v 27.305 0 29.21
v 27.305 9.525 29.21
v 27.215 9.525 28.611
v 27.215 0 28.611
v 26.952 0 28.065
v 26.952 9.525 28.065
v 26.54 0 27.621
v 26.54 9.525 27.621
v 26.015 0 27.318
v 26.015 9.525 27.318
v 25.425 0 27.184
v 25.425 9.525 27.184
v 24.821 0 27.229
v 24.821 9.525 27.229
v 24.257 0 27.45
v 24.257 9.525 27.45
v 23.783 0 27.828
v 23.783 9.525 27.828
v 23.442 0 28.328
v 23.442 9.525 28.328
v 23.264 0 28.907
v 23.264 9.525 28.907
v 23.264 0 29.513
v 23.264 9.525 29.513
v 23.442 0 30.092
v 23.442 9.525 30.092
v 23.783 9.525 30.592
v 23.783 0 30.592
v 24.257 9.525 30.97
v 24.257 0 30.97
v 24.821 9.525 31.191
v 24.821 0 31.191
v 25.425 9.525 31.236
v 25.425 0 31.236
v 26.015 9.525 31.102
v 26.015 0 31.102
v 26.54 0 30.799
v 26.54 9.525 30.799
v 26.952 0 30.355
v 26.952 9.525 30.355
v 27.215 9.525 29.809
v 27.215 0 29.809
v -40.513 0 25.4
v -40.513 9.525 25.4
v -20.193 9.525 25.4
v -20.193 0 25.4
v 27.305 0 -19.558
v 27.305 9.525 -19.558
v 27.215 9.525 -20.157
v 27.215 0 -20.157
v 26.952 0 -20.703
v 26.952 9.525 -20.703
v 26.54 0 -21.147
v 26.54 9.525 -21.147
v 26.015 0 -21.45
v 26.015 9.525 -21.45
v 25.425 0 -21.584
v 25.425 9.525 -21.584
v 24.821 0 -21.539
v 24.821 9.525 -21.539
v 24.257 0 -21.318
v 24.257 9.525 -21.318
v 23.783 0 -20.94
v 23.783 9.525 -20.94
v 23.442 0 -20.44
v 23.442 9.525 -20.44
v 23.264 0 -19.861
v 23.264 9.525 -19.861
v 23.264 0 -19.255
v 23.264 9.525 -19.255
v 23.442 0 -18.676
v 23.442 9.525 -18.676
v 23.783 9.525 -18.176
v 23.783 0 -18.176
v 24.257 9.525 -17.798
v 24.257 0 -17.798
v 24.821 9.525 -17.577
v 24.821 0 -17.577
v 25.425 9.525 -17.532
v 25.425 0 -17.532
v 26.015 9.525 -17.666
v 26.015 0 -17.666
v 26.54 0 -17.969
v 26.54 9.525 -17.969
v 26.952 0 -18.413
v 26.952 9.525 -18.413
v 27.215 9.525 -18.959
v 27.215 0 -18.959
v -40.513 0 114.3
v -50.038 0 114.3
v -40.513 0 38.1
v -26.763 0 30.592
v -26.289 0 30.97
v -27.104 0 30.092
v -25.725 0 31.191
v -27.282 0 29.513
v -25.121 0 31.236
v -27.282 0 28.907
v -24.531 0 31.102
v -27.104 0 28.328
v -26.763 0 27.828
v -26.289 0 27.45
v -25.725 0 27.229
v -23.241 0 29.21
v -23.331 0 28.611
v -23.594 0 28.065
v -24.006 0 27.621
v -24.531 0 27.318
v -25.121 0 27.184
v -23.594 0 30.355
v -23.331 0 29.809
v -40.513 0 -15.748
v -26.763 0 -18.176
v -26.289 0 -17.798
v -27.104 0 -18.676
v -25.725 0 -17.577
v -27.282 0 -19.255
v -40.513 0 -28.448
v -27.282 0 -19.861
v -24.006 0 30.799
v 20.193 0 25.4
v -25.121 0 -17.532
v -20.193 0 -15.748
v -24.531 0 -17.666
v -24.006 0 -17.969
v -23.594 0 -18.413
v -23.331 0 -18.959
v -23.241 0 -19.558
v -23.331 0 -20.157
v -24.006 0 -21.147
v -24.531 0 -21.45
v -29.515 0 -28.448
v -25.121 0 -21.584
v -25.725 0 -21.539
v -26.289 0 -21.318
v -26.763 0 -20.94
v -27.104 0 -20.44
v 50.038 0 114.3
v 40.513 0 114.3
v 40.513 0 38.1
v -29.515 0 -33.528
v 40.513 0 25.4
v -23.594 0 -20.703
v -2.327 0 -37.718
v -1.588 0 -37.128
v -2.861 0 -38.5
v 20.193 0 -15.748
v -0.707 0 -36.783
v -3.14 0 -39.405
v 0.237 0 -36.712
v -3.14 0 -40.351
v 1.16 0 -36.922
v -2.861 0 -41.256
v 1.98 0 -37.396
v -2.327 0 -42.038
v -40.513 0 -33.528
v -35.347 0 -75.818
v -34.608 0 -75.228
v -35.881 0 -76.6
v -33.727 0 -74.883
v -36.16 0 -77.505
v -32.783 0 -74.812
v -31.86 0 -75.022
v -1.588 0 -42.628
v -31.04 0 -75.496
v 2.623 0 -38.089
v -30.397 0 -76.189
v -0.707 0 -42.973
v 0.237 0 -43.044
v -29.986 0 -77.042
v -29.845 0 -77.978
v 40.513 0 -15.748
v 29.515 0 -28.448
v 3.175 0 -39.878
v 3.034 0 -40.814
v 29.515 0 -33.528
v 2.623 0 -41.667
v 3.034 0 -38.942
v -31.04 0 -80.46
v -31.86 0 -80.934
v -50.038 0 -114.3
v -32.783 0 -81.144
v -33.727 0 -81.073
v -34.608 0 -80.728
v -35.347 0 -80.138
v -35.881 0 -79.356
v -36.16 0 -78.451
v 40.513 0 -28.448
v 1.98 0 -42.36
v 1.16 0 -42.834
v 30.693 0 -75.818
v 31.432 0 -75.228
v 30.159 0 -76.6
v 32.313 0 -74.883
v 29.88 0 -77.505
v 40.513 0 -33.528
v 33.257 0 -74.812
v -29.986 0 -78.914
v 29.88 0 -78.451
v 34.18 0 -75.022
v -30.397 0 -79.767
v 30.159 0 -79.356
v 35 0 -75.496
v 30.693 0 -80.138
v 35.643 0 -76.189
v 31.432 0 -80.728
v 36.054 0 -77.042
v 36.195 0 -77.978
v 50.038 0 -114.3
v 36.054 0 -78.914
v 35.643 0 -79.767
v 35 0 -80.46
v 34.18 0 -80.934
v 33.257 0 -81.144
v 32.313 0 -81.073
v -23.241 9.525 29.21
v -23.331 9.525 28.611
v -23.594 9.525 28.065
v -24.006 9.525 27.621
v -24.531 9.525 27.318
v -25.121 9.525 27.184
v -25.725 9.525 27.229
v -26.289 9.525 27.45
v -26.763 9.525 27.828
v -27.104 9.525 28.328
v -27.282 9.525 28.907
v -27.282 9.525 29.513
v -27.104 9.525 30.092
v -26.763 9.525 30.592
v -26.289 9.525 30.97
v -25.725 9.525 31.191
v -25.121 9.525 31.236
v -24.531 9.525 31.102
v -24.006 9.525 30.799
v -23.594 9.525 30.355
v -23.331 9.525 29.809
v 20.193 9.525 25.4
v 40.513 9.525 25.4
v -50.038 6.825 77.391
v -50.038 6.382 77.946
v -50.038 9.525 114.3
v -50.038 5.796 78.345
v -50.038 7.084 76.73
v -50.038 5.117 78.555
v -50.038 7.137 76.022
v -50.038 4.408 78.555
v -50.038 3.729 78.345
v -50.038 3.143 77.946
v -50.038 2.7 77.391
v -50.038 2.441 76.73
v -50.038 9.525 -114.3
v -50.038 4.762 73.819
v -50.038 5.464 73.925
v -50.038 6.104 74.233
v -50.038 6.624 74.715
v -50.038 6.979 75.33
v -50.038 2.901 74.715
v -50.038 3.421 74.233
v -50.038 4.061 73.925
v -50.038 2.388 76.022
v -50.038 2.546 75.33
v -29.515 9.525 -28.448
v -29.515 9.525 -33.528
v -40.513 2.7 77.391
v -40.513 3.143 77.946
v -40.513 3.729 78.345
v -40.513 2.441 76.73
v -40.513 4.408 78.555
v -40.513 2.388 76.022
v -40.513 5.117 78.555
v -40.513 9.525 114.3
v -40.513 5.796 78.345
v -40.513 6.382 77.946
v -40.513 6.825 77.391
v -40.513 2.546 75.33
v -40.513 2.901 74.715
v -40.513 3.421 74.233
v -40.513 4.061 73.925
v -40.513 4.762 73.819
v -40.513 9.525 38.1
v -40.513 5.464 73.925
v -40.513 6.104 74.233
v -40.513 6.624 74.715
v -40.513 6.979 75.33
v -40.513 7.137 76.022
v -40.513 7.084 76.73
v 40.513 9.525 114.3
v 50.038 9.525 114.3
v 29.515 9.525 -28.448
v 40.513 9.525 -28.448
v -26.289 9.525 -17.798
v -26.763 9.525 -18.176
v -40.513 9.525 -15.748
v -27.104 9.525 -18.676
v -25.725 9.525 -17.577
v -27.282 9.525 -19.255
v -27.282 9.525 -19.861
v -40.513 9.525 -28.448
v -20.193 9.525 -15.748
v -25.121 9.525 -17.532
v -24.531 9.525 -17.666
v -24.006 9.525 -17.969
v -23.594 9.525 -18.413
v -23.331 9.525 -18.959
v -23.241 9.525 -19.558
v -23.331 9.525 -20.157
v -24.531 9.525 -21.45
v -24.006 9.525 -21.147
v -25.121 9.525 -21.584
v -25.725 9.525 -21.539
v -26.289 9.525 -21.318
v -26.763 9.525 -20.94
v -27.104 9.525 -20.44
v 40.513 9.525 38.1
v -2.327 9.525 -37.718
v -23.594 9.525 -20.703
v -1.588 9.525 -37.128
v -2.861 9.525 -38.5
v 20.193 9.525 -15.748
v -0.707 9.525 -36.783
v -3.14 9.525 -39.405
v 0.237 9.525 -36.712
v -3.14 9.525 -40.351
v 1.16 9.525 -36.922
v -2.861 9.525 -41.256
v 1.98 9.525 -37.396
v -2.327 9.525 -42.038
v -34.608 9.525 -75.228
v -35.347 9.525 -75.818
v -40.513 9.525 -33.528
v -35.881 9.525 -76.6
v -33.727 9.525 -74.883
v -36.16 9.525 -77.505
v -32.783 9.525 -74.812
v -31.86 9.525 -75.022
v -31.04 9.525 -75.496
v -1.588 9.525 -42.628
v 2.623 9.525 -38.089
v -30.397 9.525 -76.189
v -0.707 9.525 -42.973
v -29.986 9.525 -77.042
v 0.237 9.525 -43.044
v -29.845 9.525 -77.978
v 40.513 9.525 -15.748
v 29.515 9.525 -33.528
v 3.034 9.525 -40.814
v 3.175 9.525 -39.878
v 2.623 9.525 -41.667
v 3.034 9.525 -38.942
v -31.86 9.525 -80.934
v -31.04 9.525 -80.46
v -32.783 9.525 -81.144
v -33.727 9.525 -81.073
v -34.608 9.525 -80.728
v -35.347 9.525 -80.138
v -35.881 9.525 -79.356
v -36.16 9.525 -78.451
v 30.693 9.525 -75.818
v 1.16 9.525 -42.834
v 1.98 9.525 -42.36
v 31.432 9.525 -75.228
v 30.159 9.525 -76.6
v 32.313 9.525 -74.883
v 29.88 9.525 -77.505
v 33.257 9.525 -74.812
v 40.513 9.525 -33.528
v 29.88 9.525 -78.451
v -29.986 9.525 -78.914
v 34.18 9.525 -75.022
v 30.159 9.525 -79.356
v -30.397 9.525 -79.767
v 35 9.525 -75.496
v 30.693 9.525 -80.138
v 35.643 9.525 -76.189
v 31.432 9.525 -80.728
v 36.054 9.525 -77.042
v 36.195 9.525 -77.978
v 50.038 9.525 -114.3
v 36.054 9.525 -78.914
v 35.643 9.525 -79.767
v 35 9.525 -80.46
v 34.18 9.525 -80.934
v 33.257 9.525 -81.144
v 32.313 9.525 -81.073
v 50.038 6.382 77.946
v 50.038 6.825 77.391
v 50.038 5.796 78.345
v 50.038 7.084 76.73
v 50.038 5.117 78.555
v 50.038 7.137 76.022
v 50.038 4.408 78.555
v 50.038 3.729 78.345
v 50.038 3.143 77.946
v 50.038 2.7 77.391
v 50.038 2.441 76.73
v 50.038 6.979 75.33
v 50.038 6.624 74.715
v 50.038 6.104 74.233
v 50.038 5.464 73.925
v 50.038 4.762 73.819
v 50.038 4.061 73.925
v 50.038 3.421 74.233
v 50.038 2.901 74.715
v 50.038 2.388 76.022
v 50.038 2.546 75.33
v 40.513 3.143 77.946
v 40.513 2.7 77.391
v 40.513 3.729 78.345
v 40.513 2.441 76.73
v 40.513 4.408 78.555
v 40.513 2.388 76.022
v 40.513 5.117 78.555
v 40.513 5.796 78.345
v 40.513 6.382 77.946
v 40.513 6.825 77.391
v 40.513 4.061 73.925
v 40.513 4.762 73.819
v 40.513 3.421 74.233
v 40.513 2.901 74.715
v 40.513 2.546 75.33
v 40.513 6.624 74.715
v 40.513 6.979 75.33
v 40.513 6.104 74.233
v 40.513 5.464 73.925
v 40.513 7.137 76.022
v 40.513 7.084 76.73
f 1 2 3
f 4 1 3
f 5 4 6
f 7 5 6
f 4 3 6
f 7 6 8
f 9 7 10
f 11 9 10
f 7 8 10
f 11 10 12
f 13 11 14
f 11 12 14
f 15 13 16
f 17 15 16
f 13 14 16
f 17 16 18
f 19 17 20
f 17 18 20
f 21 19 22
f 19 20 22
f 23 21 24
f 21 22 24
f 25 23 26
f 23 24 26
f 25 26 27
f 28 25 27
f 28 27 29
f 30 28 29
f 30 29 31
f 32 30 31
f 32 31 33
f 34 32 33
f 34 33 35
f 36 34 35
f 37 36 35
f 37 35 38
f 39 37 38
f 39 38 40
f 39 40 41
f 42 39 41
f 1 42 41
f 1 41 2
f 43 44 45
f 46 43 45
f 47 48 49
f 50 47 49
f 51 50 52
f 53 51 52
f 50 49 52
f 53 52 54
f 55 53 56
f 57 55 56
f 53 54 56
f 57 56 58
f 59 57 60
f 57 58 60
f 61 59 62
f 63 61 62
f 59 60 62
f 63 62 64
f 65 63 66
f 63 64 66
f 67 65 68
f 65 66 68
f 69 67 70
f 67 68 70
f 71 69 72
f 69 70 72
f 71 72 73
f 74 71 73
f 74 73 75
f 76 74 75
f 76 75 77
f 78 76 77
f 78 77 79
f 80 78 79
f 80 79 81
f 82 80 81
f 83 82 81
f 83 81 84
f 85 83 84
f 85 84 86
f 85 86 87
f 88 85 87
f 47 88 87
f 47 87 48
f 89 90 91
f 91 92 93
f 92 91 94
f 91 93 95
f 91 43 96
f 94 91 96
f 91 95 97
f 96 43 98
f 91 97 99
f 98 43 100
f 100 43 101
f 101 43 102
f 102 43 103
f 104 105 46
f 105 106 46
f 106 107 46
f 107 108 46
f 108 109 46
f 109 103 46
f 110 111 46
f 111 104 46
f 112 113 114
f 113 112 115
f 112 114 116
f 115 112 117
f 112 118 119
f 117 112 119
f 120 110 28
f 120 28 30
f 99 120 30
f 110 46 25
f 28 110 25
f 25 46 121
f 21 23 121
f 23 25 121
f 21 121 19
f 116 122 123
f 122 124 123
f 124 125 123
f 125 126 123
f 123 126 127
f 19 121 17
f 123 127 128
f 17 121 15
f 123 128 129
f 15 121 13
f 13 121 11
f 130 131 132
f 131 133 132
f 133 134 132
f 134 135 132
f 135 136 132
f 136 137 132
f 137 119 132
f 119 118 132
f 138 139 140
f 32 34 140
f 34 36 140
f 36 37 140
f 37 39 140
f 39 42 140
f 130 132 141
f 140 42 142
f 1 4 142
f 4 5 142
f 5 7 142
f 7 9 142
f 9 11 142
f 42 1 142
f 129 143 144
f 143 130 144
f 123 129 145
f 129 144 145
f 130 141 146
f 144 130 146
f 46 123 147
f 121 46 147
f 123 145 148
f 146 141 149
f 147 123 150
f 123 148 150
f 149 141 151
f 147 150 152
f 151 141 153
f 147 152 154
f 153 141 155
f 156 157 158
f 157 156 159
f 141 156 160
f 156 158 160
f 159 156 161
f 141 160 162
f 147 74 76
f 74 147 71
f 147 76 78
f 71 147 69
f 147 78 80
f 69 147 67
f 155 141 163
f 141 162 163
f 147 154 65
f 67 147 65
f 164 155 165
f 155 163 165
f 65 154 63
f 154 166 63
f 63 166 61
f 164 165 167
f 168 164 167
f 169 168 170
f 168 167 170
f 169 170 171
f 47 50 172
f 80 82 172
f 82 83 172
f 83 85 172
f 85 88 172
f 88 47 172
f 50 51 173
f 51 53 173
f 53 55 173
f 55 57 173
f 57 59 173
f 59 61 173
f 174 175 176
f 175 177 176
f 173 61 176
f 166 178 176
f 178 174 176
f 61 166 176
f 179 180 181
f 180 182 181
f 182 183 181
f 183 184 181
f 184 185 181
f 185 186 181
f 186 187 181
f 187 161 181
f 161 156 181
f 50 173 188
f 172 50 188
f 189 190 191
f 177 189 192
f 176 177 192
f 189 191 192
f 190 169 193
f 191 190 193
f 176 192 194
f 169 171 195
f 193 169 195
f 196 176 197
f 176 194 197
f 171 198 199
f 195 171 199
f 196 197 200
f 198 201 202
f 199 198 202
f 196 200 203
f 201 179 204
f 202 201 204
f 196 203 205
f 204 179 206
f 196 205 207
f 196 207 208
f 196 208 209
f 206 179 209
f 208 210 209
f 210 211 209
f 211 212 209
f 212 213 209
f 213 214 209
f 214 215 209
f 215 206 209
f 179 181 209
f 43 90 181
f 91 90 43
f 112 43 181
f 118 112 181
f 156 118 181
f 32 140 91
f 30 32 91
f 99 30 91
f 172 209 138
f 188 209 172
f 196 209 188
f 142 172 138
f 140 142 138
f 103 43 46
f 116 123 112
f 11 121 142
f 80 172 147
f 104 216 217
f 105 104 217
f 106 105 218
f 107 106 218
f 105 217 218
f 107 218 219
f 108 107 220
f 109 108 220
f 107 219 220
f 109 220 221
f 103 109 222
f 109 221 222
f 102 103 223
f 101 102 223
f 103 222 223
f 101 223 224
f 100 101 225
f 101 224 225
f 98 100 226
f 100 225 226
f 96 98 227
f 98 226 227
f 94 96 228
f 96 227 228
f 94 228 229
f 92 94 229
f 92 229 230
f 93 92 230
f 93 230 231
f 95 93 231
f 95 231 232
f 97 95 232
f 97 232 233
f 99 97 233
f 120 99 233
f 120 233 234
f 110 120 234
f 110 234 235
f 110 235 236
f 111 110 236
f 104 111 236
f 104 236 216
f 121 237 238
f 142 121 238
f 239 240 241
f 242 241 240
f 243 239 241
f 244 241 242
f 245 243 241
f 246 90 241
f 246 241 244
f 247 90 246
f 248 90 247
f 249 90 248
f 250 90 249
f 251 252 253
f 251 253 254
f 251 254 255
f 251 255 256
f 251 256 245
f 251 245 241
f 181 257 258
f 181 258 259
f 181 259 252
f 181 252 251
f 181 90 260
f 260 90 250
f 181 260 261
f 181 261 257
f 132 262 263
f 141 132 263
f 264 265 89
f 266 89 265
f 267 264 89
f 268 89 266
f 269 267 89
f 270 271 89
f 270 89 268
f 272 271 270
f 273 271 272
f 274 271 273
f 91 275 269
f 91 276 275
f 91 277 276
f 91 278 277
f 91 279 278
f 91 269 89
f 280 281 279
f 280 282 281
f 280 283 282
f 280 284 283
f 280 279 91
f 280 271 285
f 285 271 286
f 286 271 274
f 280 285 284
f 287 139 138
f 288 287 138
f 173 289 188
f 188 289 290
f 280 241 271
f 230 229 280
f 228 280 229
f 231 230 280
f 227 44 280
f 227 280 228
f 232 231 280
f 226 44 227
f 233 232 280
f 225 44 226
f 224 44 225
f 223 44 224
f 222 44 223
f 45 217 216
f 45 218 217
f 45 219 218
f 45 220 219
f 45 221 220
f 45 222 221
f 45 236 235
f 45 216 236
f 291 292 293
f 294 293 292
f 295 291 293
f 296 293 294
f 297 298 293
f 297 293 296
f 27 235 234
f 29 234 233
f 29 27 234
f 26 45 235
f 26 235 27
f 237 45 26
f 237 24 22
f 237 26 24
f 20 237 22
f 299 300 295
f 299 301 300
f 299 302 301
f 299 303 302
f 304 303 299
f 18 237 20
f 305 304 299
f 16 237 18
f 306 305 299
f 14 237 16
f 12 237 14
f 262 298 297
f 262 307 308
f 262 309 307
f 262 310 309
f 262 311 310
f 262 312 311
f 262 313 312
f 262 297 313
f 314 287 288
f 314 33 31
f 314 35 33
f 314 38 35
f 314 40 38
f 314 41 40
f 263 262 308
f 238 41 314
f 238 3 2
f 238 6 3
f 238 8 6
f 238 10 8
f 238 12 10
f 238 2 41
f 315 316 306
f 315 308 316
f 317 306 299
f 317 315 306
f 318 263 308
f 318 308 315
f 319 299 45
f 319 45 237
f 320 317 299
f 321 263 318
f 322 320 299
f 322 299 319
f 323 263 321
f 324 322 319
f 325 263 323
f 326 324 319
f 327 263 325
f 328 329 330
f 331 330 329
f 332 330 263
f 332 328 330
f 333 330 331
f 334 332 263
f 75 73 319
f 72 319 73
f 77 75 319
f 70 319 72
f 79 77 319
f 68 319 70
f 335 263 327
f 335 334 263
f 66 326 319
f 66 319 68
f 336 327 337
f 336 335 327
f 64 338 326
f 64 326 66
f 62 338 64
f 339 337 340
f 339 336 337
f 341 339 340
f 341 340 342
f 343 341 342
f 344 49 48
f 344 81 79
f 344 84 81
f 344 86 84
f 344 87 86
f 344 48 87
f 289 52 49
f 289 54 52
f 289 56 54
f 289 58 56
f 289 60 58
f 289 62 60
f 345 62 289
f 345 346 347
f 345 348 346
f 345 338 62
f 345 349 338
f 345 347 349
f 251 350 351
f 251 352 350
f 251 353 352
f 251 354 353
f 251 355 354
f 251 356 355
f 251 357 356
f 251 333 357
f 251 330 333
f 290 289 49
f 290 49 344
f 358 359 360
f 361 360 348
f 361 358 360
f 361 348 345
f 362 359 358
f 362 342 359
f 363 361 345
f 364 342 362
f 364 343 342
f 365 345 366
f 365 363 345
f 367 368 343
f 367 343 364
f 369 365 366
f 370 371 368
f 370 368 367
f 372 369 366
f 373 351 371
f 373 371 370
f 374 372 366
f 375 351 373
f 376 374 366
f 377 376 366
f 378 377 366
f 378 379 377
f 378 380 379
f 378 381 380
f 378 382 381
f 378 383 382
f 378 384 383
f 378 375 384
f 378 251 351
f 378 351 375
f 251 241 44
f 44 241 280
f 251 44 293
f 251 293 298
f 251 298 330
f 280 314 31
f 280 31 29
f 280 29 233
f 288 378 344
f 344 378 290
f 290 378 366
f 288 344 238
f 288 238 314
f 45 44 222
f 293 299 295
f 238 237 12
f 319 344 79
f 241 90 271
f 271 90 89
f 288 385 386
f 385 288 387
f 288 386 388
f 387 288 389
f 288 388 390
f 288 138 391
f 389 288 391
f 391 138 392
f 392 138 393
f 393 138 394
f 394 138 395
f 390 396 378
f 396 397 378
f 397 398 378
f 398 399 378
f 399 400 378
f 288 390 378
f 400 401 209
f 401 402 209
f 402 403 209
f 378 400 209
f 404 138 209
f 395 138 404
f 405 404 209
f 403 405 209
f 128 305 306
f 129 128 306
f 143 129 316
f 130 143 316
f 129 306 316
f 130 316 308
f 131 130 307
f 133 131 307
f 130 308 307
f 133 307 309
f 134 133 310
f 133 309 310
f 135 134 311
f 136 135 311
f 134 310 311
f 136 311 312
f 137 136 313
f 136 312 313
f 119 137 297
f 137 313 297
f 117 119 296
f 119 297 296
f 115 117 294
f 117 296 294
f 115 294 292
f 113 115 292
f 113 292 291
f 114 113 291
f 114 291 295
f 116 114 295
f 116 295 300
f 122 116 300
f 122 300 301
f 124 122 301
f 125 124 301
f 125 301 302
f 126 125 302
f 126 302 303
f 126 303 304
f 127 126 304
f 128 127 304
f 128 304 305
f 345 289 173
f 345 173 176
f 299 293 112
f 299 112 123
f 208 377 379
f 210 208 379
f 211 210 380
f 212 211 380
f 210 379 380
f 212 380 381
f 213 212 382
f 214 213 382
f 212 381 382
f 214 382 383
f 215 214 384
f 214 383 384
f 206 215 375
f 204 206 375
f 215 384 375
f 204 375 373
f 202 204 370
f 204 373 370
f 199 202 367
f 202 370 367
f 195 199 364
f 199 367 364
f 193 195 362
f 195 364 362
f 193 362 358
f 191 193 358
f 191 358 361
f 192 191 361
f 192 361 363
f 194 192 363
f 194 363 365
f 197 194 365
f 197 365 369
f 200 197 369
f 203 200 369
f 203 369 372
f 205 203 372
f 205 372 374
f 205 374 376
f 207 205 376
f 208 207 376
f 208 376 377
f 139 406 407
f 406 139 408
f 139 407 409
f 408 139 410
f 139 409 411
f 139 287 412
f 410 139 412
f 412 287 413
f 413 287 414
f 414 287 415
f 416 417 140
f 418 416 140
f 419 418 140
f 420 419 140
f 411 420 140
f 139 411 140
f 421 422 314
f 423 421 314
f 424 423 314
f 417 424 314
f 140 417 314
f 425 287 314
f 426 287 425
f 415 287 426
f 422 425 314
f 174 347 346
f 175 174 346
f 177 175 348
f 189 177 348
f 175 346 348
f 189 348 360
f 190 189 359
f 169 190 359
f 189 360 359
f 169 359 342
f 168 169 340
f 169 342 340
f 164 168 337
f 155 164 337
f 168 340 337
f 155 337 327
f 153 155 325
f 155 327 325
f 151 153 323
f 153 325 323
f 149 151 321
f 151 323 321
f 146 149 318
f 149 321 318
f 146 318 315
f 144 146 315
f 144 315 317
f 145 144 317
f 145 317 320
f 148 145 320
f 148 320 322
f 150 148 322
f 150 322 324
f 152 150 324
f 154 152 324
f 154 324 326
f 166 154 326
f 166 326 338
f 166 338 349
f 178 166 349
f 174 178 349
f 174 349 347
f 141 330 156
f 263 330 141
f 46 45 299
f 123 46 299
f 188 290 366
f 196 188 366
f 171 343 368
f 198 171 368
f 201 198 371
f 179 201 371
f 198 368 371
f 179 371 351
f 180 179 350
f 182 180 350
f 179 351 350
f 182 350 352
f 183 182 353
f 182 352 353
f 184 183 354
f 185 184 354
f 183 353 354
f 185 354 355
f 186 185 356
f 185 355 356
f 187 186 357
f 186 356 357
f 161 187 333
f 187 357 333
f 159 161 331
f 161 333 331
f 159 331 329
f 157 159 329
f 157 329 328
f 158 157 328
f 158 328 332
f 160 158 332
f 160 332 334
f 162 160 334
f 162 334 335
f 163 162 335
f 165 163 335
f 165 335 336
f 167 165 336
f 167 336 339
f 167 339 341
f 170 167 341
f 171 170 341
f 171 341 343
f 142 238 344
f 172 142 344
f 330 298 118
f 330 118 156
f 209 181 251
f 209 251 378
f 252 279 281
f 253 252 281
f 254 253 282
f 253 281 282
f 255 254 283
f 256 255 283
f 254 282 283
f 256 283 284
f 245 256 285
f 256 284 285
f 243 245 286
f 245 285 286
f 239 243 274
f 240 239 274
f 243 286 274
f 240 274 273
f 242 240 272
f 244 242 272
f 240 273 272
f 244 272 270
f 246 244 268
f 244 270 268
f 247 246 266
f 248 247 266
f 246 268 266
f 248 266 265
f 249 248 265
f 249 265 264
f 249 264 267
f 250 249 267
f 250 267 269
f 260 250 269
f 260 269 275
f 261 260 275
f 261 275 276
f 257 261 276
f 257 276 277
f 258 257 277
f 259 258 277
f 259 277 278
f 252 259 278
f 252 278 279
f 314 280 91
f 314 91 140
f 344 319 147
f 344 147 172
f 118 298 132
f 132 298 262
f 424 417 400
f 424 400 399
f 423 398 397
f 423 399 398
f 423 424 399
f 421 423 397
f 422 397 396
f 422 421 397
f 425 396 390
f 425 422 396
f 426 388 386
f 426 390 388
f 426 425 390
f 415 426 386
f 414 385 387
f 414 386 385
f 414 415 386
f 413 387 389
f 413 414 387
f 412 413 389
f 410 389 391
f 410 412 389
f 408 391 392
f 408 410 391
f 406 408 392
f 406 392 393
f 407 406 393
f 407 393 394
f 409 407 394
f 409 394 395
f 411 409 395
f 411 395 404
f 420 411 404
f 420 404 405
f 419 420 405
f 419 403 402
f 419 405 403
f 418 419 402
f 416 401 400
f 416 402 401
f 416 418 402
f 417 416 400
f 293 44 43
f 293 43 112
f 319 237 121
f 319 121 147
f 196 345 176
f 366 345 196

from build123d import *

# Parameters (mm, degrees)
SKETCH1_W               = 100.076
SKETCH1_H               = 228.6
BOSS_EXTRUDE1_DEPTH     = 9.525
SKETCH2_W               = 81.026
SKETCH2_H               = 76.2
CUT_EXTRUDE1_DEPTH      = 10.525
SKETCH3_W               = 20.32
SKETCH3_H               = 41.148
SKETCH3_W_2             = 10.9982
SKETCH3_H_2             = 5.08
CUT_EXTRUDE2_DEPTH      = 10.525
SKETCH4_R               = 2.38125
CUT_EXTRUDE3_DEPTH      = 91.551
CUT_EXTRUDE3_DEPTH_BACK = 10.525
SKETCH6_R               = 3.175
CUT_EXTRUDE5_DEPTH      = 10.525
SKETCH5_R               = 2.032
SKETCH5_R_2             = 3.175
CUT_EXTRUDE4_DEPTH      = 1
CUT_EXTRUDE4_DEPTH_BACK = 10.525


with BuildPart() as part:
    # Sketch1 → Boss-Extrude1 (new body)
    with BuildSketch(Plane(origin=(0, 0, 0), x_dir=(1, 0, 0), z_dir=(0, 1, 0))):
        Rectangle(SKETCH1_W, SKETCH1_H)
    extrude(amount=BOSS_EXTRUDE1_DEPTH)

    # Sketch2 → Cut-Extrude1 (cut, through all)
    with BuildSketch(Plane(origin=(0, 9.525, 0), x_dir=(1, 0, 0), z_dir=(0, 1, 0))):
        with Locations((0, -76.2)):
            Rectangle(SKETCH2_W, SKETCH2_H)
    extrude(amount=-CUT_EXTRUDE1_DEPTH, mode=Mode.SUBTRACT)

    # Sketch3 → Cut-Extrude2 (cut, through all)
    with BuildSketch(Plane(origin=(0, 9.525, 0), x_dir=(1, 0, 0), z_dir=(0, 1, 0))):
        with Locations((-30.353, -4.826)):
            Rectangle(SKETCH3_W, SKETCH3_H)
        with Locations((-35.0139, 30.988)):
            Rectangle(SKETCH3_W_2, SKETCH3_H_2)
        with Locations((30.353, -4.826)):
            Rectangle(SKETCH3_W, SKETCH3_H)
        with Locations((35.0139, 30.988)):
            Rectangle(SKETCH3_W_2, SKETCH3_H_2)
    extrude(amount=-CUT_EXTRUDE2_DEPTH, mode=Mode.SUBTRACT)

    # Sketch4 → Cut-Extrude3 (cut, two sides)
    with BuildSketch(Plane(origin=(-40.513, 0, 0), x_dir=(0, 0, -1), z_dir=(1, 0, 0))) as cut_extrude3_sk:
        with Locations((-76.2, 4.7625)):
            Circle(SKETCH4_R)
    extrude(amount=CUT_EXTRUDE3_DEPTH, mode=Mode.SUBTRACT)
    extrude(cut_extrude3_sk.sketch, amount=-CUT_EXTRUDE3_DEPTH_BACK, mode=Mode.SUBTRACT)

    # Sketch6 → Cut-Extrude5 (cut, through all)
    with BuildSketch(Plane(origin=(0, 9.525, 0), x_dir=(1, 0, 0), z_dir=(0, 1, 0))):
        with Locations((0, 39.878)):
            Circle(SKETCH6_R)
    extrude(amount=-CUT_EXTRUDE5_DEPTH, mode=Mode.SUBTRACT)

    # Sketch5 → Cut-Extrude4 (cut, two sides)
    with BuildSketch(Plane(origin=(0, 9.525, 0), x_dir=(1, 0, 0), z_dir=(0, 1, 0))) as cut_extrude4_sk:
        with Locations((-25.273, 19.558)):
            Circle(SKETCH5_R)
        with Locations((-25.273, -29.21)):
            Circle(SKETCH5_R)
        with Locations((25.273, -29.21)):
            Circle(SKETCH5_R)
        with Locations((25.273, 19.558)):
            Circle(SKETCH5_R)
        with Locations((-33.02, 77.978)):
            Circle(SKETCH5_R_2)
        with Locations((33.02, 77.978)):
            Circle(SKETCH5_R_2)
    extrude(amount=CUT_EXTRUDE4_DEPTH, mode=Mode.SUBTRACT)
    extrude(cut_extrude4_sk.sketch, amount=-CUT_EXTRUDE4_DEPTH_BACK, mode=Mode.SUBTRACT)


solid = part.part
